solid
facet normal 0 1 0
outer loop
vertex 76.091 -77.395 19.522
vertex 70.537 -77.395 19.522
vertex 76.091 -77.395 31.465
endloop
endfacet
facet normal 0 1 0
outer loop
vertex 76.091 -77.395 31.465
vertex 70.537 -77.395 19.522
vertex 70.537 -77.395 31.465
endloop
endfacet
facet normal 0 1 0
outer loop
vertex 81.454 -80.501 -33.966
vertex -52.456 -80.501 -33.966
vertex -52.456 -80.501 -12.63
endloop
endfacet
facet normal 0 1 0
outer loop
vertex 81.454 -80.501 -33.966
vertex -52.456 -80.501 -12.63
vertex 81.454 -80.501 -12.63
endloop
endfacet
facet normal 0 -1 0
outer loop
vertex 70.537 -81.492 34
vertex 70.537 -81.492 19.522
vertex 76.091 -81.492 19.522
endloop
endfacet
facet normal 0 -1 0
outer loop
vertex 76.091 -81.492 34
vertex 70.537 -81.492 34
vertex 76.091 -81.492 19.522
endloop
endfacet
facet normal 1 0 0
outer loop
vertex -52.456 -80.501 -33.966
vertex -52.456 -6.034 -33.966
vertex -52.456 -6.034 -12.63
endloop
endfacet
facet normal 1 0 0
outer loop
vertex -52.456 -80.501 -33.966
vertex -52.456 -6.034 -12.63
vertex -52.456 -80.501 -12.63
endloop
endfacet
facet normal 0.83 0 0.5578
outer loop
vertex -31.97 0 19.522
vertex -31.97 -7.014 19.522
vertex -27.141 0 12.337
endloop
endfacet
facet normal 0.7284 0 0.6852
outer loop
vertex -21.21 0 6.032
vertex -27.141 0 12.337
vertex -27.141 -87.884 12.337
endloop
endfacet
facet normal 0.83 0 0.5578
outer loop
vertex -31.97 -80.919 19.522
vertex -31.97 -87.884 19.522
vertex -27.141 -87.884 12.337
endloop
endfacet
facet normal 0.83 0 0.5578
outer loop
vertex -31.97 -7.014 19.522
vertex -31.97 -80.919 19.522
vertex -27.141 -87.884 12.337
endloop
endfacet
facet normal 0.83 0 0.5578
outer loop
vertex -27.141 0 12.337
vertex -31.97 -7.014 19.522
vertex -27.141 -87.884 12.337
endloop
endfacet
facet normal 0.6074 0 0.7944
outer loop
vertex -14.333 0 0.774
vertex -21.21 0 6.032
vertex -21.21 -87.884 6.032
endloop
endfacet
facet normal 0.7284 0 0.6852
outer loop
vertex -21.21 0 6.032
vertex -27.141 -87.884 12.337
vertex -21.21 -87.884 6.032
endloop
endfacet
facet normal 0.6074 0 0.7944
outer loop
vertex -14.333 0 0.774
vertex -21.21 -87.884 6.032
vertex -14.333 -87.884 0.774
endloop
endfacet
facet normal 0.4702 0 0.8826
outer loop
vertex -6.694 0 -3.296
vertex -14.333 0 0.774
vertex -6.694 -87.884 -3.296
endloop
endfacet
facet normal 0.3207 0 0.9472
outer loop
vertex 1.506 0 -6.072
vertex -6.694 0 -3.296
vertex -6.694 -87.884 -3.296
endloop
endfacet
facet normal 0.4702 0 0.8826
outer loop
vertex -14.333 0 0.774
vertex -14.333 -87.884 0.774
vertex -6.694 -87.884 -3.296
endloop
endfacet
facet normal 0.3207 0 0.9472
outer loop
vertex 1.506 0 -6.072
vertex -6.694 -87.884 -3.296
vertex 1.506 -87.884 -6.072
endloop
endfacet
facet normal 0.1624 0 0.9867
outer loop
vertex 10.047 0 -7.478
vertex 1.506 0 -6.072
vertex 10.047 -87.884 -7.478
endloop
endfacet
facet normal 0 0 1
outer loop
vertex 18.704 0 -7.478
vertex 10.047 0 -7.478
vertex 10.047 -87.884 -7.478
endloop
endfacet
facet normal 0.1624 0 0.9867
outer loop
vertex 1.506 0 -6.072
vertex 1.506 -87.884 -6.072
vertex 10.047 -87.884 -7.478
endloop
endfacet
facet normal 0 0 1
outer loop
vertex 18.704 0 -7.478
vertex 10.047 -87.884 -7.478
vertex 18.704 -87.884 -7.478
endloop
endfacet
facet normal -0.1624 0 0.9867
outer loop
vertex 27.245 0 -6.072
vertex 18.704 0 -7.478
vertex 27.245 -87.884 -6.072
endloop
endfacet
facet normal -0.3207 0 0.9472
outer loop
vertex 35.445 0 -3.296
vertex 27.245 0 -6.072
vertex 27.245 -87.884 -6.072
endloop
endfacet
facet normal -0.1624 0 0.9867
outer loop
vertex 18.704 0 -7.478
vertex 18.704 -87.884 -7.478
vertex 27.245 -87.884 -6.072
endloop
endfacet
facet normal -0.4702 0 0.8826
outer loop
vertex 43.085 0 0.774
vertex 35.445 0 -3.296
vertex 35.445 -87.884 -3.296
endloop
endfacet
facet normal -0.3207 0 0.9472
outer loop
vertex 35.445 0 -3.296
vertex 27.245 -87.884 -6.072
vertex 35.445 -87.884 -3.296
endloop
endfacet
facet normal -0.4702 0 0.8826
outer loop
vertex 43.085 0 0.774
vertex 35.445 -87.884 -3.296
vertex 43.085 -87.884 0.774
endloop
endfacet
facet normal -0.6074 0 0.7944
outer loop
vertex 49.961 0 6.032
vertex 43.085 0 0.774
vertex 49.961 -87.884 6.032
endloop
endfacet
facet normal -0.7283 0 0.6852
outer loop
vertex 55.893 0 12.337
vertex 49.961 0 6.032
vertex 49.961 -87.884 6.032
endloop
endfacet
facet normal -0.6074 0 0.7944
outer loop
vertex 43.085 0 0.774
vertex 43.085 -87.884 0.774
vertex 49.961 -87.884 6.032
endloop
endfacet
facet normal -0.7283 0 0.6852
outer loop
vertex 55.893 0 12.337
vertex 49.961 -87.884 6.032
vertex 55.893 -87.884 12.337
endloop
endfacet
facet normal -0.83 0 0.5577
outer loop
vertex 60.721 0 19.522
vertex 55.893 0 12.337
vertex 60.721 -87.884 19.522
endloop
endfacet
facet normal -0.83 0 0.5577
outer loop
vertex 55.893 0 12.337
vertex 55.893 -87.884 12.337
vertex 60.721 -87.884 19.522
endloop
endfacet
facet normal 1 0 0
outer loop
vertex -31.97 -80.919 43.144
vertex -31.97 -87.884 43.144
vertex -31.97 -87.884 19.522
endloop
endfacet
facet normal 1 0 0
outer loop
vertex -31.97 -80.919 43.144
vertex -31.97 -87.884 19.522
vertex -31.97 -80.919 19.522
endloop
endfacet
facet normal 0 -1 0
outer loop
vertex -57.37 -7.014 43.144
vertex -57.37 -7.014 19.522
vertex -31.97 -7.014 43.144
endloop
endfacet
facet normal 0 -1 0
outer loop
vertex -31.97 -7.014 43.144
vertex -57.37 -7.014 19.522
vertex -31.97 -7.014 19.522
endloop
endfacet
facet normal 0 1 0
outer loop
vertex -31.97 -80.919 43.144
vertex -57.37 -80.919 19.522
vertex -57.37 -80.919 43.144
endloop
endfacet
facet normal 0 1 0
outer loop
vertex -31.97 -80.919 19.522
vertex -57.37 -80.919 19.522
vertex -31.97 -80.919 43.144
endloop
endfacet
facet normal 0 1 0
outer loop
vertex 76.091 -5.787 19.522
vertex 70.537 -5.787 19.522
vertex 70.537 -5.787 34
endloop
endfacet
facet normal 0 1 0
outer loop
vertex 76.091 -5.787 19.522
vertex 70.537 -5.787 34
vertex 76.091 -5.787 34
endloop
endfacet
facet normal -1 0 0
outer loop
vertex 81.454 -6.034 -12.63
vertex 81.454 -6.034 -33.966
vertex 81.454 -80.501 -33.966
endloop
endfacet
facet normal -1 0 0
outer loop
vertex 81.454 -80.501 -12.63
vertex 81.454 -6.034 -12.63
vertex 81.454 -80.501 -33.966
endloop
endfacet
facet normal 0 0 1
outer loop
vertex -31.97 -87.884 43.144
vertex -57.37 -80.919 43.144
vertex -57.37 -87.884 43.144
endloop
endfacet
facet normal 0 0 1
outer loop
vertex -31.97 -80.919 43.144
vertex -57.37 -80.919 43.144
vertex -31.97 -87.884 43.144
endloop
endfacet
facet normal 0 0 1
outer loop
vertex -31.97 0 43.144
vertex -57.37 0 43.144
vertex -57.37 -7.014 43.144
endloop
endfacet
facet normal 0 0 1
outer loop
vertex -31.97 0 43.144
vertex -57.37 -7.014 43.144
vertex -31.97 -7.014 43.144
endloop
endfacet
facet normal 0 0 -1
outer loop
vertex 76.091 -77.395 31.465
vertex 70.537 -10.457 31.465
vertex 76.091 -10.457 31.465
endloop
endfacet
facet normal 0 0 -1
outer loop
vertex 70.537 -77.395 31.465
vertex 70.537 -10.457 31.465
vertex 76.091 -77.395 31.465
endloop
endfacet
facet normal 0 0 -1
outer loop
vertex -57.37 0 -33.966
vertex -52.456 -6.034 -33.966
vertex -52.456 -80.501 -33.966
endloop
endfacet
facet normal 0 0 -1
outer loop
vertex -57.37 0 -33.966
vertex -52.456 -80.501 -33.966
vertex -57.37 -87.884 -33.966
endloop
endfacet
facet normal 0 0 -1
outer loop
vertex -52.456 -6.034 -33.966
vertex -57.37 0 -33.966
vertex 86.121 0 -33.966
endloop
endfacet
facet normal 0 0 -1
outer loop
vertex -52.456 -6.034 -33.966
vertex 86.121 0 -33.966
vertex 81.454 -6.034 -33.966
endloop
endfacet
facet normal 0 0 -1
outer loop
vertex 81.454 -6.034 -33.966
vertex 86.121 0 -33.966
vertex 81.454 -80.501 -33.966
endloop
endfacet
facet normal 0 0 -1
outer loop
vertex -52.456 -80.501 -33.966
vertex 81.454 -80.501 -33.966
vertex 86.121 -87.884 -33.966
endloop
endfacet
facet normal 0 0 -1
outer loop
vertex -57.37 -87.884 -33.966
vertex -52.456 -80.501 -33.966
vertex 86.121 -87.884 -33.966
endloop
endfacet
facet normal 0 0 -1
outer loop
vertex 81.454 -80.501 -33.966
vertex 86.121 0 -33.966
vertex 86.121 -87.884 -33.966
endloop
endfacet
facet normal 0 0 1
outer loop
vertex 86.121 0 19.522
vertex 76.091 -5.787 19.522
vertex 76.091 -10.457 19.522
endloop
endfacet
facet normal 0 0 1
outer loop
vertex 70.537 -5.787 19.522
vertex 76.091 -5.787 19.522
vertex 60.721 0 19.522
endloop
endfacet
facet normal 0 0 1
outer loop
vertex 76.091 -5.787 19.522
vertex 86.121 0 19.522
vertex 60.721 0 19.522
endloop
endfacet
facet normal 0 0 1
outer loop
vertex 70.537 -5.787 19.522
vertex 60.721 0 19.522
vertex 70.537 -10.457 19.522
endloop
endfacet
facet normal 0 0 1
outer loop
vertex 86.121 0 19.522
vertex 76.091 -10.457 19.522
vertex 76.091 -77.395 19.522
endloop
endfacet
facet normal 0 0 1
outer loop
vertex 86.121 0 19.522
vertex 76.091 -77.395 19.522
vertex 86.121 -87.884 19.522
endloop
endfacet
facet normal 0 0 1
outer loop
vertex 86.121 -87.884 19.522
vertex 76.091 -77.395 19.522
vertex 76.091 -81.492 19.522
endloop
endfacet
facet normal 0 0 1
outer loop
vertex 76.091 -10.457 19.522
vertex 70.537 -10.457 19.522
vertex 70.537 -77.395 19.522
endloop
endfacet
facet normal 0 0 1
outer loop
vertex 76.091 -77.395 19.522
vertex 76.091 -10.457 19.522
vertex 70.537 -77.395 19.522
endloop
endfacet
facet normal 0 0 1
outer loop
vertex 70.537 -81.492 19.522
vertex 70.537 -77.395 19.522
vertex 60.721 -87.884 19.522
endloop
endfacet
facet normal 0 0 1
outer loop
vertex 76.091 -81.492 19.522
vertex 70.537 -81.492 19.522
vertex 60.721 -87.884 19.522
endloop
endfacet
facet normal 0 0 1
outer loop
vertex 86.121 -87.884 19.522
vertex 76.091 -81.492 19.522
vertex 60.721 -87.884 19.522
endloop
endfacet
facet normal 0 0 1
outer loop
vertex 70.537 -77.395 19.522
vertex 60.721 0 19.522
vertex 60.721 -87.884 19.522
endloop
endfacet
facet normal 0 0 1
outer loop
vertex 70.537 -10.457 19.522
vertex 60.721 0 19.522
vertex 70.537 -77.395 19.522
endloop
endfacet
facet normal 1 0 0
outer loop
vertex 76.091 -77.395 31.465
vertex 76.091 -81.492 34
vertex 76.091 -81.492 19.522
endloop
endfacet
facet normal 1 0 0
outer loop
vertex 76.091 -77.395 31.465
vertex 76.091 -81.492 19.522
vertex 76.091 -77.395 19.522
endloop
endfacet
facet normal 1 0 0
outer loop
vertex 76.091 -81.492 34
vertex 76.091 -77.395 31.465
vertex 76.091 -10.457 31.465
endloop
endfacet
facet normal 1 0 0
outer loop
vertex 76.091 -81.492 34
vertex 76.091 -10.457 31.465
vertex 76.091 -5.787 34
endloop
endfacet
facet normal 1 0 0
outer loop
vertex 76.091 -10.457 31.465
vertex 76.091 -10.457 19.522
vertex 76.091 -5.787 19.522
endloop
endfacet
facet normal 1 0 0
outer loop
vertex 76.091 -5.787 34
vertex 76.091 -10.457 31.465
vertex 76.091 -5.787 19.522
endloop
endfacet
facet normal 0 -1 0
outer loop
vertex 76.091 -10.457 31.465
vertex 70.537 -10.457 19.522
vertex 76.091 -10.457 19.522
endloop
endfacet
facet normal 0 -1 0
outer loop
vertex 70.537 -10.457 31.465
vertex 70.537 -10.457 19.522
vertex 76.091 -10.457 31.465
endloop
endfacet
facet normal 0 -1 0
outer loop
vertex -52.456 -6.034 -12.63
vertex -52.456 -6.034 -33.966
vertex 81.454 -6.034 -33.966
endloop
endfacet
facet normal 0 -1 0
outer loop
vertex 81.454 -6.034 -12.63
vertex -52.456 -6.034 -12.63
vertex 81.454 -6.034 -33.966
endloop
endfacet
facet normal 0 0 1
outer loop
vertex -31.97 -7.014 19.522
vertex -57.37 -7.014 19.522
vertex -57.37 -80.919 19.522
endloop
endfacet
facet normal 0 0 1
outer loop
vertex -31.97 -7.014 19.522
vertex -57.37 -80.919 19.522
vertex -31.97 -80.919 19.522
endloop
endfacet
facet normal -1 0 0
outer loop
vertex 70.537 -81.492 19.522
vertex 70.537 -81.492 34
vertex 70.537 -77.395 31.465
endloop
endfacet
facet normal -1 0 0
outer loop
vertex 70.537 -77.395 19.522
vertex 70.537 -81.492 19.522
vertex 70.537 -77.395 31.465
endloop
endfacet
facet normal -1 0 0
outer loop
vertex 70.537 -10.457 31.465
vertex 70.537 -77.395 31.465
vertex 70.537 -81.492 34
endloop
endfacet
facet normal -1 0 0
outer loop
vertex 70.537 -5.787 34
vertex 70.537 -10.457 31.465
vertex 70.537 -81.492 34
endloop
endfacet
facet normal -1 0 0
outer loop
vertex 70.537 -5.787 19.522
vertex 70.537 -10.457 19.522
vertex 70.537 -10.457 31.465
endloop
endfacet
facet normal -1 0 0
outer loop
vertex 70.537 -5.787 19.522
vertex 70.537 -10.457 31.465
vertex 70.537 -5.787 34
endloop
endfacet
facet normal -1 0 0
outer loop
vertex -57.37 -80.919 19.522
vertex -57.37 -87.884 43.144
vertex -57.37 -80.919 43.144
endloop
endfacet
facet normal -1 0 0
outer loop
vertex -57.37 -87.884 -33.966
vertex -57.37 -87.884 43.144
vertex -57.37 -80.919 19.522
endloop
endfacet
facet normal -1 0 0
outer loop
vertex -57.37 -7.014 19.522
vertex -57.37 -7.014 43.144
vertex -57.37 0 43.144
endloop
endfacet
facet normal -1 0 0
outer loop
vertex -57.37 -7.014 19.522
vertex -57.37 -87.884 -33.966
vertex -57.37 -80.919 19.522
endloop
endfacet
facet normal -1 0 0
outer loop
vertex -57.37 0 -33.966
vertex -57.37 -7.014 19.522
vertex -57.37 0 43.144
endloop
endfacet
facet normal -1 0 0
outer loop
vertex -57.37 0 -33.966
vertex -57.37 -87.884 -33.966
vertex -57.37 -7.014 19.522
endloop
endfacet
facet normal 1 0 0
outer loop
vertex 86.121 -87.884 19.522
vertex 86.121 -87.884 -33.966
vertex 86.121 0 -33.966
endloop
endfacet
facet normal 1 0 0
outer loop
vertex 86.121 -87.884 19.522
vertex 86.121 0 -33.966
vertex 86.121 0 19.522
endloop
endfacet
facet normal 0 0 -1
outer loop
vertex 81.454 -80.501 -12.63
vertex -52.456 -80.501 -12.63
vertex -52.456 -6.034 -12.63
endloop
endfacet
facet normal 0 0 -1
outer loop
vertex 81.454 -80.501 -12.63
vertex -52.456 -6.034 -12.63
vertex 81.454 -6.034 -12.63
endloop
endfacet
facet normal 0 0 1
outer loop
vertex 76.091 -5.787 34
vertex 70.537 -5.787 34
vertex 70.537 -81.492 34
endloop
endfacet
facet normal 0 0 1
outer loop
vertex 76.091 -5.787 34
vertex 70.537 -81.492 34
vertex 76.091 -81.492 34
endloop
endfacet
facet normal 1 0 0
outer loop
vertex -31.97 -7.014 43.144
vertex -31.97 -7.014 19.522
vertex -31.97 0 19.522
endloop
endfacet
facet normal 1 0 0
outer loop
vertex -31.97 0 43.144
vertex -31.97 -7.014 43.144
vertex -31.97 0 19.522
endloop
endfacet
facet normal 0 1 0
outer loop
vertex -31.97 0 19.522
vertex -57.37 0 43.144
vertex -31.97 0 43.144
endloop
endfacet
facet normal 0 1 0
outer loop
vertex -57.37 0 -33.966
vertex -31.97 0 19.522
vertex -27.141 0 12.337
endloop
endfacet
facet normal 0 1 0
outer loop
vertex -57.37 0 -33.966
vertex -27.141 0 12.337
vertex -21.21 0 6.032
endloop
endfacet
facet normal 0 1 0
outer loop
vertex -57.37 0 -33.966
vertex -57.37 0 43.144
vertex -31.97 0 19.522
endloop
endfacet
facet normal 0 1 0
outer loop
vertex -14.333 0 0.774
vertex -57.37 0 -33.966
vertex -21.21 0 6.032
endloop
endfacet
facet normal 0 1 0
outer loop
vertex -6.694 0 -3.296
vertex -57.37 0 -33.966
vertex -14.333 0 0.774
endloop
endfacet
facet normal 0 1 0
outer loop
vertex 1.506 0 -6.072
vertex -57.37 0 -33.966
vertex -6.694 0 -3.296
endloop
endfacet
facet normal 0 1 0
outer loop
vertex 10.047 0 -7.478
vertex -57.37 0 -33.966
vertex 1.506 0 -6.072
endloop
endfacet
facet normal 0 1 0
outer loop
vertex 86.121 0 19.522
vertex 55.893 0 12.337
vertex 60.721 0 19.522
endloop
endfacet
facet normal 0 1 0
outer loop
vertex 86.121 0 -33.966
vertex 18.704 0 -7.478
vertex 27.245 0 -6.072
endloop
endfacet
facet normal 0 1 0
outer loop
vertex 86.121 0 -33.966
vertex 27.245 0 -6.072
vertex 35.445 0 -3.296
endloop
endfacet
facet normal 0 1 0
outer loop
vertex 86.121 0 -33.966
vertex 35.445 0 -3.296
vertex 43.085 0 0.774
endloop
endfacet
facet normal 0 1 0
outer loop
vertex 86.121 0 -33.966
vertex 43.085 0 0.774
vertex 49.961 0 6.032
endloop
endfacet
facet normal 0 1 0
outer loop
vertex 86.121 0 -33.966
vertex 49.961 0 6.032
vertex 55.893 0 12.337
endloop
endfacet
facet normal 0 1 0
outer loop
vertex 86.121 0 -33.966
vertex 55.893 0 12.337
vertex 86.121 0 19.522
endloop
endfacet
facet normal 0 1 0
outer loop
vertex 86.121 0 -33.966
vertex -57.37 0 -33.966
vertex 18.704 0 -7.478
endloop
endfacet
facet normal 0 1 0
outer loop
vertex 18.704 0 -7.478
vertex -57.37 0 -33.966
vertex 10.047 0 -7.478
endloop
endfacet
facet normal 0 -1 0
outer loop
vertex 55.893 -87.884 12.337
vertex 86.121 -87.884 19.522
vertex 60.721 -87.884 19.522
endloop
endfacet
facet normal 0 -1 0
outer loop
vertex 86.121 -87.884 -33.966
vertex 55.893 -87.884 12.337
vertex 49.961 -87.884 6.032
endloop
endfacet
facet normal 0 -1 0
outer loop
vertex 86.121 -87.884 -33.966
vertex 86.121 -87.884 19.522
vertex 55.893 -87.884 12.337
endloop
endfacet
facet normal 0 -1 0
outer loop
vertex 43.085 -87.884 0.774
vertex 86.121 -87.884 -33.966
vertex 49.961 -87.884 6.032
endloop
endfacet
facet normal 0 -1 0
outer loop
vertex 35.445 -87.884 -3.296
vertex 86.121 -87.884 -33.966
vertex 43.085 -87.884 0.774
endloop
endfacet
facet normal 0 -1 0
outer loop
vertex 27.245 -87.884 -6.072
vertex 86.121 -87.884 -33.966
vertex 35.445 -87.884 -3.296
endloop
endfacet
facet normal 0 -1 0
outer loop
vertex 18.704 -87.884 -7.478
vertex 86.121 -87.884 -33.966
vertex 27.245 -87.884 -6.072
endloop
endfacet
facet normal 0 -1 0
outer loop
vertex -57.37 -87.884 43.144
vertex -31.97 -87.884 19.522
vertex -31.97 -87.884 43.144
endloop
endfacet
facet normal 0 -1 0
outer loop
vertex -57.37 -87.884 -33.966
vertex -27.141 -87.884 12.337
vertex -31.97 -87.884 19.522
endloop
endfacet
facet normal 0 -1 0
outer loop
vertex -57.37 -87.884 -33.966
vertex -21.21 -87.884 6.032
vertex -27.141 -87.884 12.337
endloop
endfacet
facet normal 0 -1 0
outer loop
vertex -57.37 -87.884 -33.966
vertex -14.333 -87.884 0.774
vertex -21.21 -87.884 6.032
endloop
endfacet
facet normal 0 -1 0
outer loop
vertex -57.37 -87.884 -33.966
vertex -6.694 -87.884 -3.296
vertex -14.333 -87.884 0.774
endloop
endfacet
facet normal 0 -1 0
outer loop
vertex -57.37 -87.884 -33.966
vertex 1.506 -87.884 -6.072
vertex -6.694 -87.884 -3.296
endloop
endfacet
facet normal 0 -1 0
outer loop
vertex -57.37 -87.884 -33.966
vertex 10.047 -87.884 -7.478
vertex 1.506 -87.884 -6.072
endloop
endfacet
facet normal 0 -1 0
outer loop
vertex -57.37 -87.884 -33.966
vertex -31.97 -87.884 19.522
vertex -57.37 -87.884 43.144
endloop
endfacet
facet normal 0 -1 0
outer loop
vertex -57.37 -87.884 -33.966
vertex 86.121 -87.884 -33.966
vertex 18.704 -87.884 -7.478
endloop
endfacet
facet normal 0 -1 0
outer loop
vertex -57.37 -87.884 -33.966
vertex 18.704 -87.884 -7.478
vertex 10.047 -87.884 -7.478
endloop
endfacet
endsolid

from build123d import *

# Parameters (mm, degrees)
F0_W      = 92.690166086
F0_H      = 53.4883048385
F1_DEPTH  = 87.884
F3_DEPTH  = 162.814
F4_DEPTH  = 25.4
F5_DEPTH  = 25.4
F6_W      = 5.5537819862
F6_H      = 75.7047273219
F7_DEPTH  = 14.478
F8_W      = 66.9379513711
F8_H      = 11.9429174811
F9_DEPTH  = 64.262
F10_W     = 133.9104250073
F10_H     = 74.4668878615
F11_DEPTH = 21.336
F12_DEPTH = 25.4
F13_W     = 25.4
F13_H     = 87.884
F14_DEPTH = 25.4
F15_W     = 25.4
F15_H     = 7.0143197663
F15_H_2   = 6.9646001425
F16_DEPTH = 42.418
F17_DEPTH = 18.796


with BuildPart() as f1:
    # F0 (on Front) → F1 (new body)
    with BuildSketch(Plane.XZ):
        with Locations((14.3755543977, -7.2218449786)):
            Rectangle(F0_W, F0_H)
    extrude(amount=F1_DEPTH)

    # F2 (on face) → F3 (cut)
    with BuildSketch(Plane.XZ.offset(87.884)):
        with BuildLine():
            Line((60.7206374407, 19.5223074406), (-31.9695286453, 19.5223074406))
            ThreePointArc((-31.9695286453, 19.5223074406), (14.3755543977, -7.6549383903), (60.7206374407, 19.5223074406))
        make_face()
    extrude(amount=-F3_DEPTH, mode=Mode.SUBTRACT)

    # F4 (add): a face of the model
    f4_faces = [f1.faces().sort_by_distance(p)[0] for p in [
        (60.7206374407, -43.942, -7.2218449786),
    ]]
    extrude(f4_faces, amount=F4_DEPTH)

    # F5 (add): a face of the model
    f5_faces = [f1.faces().sort_by_distance(p)[0] for p in [
        (-31.9695286453, -43.942, -7.2218449786),
    ]]
    extrude(f5_faces, amount=F5_DEPTH)

    # F6 (on face) → F7 (join)
    with BuildSketch(Plane.XY.offset(19.5223074406)):
        with Locations((73.3140408993, -43.6391439289)):
            Rectangle(F6_W, F6_H)
    extrude(amount=F7_DEPTH)

    # F8 (on face) → F9 (cut)
    with BuildSketch(Plane(origin=(70.5371499062, 0, 0), x_dir=(0, -1, 0), z_dir=(-1, 0, 0))):
        with Locations((43.9264485613, 25.4937661812)):
            Rectangle(F8_W, F8_H)
    extrude(amount=-F9_DEPTH, mode=Mode.SUBTRACT)

    # F10 (on face) → F11 (cut)
    with BuildSketch(Plane(origin=(0, 0, -33.9659973979), x_dir=(1, 0, 0), z_dir=(0, 0, -1))):
        with Locations((14.4990645349, 43.2672258466)):
            Rectangle(F10_W, F10_H)
    extrude(amount=-F11_DEPTH, mode=Mode.SUBTRACT)

    # F12 (add): a face of the model
    f12_faces = [f1.faces().sort_by_distance(p)[0] for p in [
        (-44.6695286453, -43.942, 19.5223074406),
    ]]
    extrude(f12_faces, amount=F12_DEPTH)

    # F13 (on face) → F14 (cut)
    with BuildSketch(Plane.XY.offset(44.9223074406)):
        with Locations((-44.6695286453, -43.942)):
            Rectangle(F13_W, F13_H)
    extrude(amount=-F14_DEPTH, mode=Mode.SUBTRACT)

    # F15 (on face) → F16 (join)
    with BuildSketch(Plane.XY.offset(19.5223074406)):
        with Locations((-44.6695286453, -3.5071598832)):
            Rectangle(F15_W, F15_H)
        with Locations((-44.6695286453, -84.4016999288)):
            Rectangle(F15_W, F15_H_2)
    extrude(amount=F16_DEPTH)

    # F17 (cut): faces of the model
    f17_faces = [f1.faces().sort_by_distance(p)[0] for p in [
        (-44.6695286453, -84.4016999288, 61.9403074406),
        (-44.6695286453, -3.5071598832, 61.9403074406),
    ]]
    extrude(f17_faces, amount=-F17_DEPTH, mode=Mode.SUBTRACT)


solid = f1.part
